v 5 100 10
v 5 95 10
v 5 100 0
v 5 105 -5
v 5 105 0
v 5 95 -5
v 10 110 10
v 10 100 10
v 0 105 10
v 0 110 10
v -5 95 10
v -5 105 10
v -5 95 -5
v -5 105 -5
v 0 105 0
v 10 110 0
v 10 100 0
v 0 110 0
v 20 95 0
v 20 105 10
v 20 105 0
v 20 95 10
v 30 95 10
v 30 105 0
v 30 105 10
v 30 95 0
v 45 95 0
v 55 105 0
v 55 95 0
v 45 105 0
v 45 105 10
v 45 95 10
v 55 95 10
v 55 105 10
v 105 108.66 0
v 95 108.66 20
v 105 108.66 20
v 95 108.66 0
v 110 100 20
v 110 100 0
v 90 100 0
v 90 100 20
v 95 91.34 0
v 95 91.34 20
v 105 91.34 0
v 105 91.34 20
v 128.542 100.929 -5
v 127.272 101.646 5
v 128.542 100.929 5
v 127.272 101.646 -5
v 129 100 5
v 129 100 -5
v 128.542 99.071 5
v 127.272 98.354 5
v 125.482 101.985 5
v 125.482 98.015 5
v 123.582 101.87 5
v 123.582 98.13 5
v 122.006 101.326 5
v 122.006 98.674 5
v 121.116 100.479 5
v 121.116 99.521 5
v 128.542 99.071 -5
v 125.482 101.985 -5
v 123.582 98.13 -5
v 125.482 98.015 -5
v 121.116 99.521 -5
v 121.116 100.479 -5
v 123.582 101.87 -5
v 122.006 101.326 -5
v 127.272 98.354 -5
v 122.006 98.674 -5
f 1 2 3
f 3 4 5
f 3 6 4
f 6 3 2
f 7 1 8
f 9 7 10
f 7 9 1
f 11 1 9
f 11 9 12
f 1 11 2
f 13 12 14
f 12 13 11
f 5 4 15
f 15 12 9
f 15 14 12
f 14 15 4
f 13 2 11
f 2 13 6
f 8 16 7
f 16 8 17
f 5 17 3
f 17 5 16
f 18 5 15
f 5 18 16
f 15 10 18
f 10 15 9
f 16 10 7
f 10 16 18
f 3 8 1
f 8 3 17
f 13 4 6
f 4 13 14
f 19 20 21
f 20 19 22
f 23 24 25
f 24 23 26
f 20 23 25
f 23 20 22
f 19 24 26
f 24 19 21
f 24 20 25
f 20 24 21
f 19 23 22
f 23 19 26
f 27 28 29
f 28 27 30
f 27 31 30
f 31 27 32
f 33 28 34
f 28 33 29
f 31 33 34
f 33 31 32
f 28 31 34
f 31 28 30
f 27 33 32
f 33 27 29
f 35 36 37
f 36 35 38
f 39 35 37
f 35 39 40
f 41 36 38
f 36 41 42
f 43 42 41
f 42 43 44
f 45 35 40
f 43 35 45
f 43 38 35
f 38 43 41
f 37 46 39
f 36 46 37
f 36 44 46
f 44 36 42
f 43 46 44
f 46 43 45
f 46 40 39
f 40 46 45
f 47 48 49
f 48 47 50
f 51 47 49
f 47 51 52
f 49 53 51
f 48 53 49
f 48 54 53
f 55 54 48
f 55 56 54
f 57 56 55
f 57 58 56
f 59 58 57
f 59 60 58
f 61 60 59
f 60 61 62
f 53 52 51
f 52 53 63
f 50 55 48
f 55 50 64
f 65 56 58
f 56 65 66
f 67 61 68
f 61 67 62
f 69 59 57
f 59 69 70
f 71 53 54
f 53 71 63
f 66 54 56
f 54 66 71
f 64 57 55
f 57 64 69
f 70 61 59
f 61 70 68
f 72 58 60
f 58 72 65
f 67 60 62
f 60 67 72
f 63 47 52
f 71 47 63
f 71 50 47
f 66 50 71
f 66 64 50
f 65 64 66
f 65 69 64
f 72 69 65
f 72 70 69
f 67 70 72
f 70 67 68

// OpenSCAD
//
// 3D Shapes
//

/** A cube centered on the XY plane by default but not on the Z axis.
Same behavior as cylinder(center=false).
\param size Cube dimensions
\param center True --> cube_XY and cube behave the same
*/
module cube_XY(size, center = false) {
  if (is_list(size)) {
    translate([ -size[0], -size[1], center ? -size[2] : 0.0 ] / 2.0) cube(size);
  } else {
    translate([ -size, -size, center ? -size : 0.0 ] / 2.0) cube(size);
  }
}

/** A cylinder with only 6 sides
\param size Size on the XY plane
\param height Extrusion size on the Z axis
*/
module hexagon(size, height) { cylinder(r = size, h = height, $fn = 6); }

// Oval shape
module oval(height, rx, ry, center = false) {
  scale([ 1, rx / ry, 1 ]) cylinder(h = height, r = ry, center = center);
}

// A cube built by extrusion of square_rounded centered on the XY plane
module cube_XY_rounded(size, radius = 1.0, center = false) {
  sizeVec = is_list(size) ? size : [ size, size, size ];
  translate([ 0, 0, center ? -sizeVec[2] / 2.0 : 0.0 ])
      linear_extrude(height = sizeVec[2])
          square_rounded(size = sizeVec, radius = radius, center = true);
}

// A cube built by extrusion of square_rounded
module cube_rounded(size, radius = 1.0, center = false) {
  sizeVec = is_list(size) ? size : [ size, size, size ];
  translate([ 0, 0, center ? -sizeVec[2] / 2.0 : 0.0 ])
      linear_extrude(height = sizeVec[2])
          square_rounded(size = sizeVec, radius = radius, center = center);
}

//
// 2D Shapes
//

// Irregular circle (Y axis scaled)
module ellipse(width, depth) {
  scale([ 1, depth / width, 1 ]) circle(r = width / 2);
}

// A square with rounded corners
module square_rounded(size = [ 1.0, 1.0 ], radius = 1.0, center = false) {
  x = is_list(size) ? size[0] : size;
  y = is_list(size) ? size[1] : size;

  // If center is false, we need to translate
  if (center) {
    body();
  } else {
    translate([ x / 2, y / 2, 0 ]) body();
  }

  module body() {
    hull() {
      // Put circle on each corner
      translate([ (-x / 2) + (radius), (-y / 2) + (radius), 0 ]) {
        circle(r = radius);
      }

      translate([ (x / 2) - (radius), (-y / 2) + (radius), 0 ]) {
        circle(r = radius);
      }

      translate([ (-x / 2) + (radius), (y / 2) - (radius), 0 ]) {
        circle(r = radius);
      }

      translate([ (x / 2) - (radius), (y / 2) - (radius), 0 ]) {
        circle(r = radius);
      }
    }
  }
}

// Tests
// 3D
translate([ 0, 100, 0 ]) {
  cube_XY(10);
  color("Red", 0.5) cube(10, center = false);
  color("Orange", 0.5) cube(10, center = true);
  color("Green", 0.5) translate([ 0, 0, 5 ]) cube(10, center = true);
}
translate([ 25, 100, 0 ]) translate([ 0, 0, 5 ]) {
  cube_rounded(10, radius = 3.0, center = true);
  color("Green", 0.5) cube(10, center = true);
}
translate([ 50, 100, 0 ]) {
  cube_XY_rounded(10, radius = 3.0);
  color("Green", 0.5) cube_XY(10);
}

translate([ 100, 100, 0 ]) hexagon(10, 20);
translate([ 125, 100, 0 ]) oval(10, 2, 4, center = true);

// 2D
translate([ 0, 0, 0 ]) ellipse(10, 50);
translate([ 25, 0, 0 ]) {
  square_rounded([ 15, 10 ], 4.0, center = true);
  color("Green", 0.5) square([ 15, 10 ], center = true);
}
